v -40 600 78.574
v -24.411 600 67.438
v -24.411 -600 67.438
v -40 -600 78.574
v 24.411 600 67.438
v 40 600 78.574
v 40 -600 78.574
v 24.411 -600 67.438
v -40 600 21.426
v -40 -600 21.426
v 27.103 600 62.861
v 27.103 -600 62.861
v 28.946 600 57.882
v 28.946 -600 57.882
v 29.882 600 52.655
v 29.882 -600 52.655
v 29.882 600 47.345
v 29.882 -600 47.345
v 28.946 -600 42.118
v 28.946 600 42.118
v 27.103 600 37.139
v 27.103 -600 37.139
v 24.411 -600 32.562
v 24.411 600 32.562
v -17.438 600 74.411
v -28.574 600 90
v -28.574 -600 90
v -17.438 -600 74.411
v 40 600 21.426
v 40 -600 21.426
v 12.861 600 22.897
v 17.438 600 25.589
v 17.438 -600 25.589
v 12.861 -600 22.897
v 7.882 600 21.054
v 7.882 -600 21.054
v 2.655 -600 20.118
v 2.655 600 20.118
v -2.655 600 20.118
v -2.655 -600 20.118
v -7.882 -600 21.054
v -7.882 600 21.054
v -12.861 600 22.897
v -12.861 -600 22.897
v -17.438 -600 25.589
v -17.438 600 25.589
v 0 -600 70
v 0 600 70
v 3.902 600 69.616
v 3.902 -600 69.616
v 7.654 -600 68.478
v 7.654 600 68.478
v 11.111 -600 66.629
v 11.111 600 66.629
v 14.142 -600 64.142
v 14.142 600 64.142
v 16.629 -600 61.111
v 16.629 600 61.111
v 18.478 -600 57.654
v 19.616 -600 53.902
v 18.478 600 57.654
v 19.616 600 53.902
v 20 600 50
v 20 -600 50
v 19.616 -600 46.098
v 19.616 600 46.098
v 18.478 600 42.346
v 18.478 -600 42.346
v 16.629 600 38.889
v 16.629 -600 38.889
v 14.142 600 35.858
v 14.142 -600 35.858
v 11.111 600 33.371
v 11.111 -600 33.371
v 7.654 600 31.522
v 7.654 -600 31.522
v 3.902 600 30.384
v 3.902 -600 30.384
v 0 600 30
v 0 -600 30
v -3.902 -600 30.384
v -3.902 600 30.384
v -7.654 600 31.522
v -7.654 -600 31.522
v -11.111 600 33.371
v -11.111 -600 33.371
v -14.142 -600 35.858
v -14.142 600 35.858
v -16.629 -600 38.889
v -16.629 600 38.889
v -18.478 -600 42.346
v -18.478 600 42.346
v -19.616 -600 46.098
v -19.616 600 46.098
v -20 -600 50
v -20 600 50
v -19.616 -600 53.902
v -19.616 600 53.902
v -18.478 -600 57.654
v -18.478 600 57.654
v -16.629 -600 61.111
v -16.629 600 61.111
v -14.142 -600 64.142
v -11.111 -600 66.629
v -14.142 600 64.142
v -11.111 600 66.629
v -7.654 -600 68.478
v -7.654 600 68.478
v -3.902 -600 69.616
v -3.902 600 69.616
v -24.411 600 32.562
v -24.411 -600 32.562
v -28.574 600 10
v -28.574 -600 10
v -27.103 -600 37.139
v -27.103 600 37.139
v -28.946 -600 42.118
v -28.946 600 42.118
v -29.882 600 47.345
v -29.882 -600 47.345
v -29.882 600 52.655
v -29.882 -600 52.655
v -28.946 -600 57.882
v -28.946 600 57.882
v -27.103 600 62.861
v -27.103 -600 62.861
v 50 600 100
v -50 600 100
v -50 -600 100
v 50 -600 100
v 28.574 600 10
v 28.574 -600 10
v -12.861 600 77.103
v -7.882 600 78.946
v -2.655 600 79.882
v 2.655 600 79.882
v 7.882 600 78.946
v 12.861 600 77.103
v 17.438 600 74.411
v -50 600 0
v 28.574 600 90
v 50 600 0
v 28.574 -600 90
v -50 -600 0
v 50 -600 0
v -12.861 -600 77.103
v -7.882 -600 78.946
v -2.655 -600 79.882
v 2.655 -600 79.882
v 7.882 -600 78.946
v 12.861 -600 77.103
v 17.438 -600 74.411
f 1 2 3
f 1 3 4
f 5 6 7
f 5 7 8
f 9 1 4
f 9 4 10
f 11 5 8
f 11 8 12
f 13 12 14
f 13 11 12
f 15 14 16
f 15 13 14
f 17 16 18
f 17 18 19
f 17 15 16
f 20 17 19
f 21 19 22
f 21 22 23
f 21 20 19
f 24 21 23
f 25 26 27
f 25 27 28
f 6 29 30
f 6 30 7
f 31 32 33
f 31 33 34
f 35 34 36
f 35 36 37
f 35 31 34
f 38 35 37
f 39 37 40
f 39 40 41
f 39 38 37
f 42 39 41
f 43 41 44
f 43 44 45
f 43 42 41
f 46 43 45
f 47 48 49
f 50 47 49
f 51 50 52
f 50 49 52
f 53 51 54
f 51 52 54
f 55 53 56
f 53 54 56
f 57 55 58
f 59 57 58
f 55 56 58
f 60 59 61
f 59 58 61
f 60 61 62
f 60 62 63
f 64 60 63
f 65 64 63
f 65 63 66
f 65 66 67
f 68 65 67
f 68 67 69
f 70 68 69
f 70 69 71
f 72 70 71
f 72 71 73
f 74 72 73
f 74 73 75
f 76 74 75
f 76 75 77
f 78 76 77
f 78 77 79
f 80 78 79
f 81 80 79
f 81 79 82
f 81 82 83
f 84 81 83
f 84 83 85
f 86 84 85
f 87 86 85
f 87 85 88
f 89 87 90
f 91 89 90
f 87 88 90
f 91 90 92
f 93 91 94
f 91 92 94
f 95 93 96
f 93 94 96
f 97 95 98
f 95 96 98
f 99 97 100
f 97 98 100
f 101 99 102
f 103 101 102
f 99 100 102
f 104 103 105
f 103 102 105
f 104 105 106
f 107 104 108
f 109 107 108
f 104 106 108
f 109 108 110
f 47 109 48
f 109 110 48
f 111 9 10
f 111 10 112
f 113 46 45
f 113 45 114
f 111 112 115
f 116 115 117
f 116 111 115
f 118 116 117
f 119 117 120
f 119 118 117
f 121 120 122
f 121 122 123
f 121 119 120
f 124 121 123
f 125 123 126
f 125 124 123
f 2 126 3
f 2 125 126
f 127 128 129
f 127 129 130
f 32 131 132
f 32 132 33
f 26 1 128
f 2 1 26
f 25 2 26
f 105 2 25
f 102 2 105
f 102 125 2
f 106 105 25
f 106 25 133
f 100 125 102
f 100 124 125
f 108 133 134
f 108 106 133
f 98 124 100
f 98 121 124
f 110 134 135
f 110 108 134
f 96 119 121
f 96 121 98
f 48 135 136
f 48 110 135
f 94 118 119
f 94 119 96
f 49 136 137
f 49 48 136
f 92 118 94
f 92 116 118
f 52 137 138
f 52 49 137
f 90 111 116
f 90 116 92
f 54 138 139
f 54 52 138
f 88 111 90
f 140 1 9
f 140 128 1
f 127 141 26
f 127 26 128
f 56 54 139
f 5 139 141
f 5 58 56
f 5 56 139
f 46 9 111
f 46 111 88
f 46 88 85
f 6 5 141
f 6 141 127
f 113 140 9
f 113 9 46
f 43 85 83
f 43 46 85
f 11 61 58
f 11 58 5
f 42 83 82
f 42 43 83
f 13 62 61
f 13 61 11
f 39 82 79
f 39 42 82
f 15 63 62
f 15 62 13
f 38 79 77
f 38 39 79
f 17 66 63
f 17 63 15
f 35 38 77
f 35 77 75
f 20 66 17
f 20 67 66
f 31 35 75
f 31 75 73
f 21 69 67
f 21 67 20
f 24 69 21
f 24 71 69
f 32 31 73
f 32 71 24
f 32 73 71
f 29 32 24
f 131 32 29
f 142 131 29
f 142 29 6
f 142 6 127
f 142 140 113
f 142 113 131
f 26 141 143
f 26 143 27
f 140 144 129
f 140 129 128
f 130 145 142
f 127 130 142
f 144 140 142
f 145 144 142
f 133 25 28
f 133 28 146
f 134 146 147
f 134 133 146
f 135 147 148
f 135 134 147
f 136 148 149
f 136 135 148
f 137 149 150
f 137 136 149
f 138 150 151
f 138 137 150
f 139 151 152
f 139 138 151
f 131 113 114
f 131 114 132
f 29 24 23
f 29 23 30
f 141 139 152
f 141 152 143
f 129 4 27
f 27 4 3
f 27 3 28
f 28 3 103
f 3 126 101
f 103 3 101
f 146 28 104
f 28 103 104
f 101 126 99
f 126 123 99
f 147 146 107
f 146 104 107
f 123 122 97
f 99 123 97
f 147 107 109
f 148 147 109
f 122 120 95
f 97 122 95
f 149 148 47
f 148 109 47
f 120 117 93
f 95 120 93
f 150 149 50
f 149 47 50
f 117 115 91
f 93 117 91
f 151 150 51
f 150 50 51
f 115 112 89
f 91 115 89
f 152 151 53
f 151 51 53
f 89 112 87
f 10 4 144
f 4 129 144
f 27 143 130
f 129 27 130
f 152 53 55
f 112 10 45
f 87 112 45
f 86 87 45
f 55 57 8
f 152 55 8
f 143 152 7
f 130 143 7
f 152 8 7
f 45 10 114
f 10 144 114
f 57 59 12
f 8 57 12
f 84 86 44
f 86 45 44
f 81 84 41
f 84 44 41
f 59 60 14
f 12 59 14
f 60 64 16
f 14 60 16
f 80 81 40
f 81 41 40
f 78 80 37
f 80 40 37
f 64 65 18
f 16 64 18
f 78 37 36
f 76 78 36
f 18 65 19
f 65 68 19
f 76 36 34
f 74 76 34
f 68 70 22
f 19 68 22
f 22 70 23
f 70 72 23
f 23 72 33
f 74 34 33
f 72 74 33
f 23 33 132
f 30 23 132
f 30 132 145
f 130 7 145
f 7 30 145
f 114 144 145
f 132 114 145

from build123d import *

# Parameters (mm, degrees)
SKETCH1_W           = 100
SKETCH1_H           = 1200
BOSS_EXTRUDE1_DEPTH = 100
SKETCH3_R           = 20
CUT_EXTRUDE1_DEPTH  = 1206.197079319


with BuildPart() as part:
    # Sketch1 → Boss-Extrude1 (new body)
    with BuildSketch(Plane.XY):
        Rectangle(SKETCH1_W, SKETCH1_H)
    extrude(amount=BOSS_EXTRUDE1_DEPTH)

    # Sketch3 → Cut-Extrude1 (cut, through all)
    with BuildSketch(Plane(origin=(0, 600, 0), x_dir=(1, 0, 0), z_dir=(0, 1, 0))):
        with Locations(Location((0, -50, 0), (0, 0, 270))):
            Circle(SKETCH3_R)
        with BuildLine():
            Line((-24.411222461, -67.438240105), (-40, -78.57413656))
            Line((-40, -78.57413656), (-40, -21.42586344))
            Line((-40, -21.42586344), (-24.411222461, -32.561759895))
            ThreePointArc((-24.411222461, -32.561759895), (-30, -50), (-24.411222461, -67.438240105))
        make_face()
        with BuildLine():
            Line((-17.438240105, -25.588777539), (-28.57413656, -10))
            Line((-28.57413656, -10), (28.57413656, -10))
            Line((28.57413656, -10), (17.438240105, -25.588777539))
            ThreePointArc((17.438240105, -25.588777539), (0, -20), (-17.438240105, -25.588777539))
        make_face()
        with BuildLine():
            Line((24.411222461, -32.561759895), (40, -21.42586344))
            Line((40, -21.42586344), (40, -78.57413656))
            Line((40, -78.57413656), (24.411222461, -67.438240105))
            ThreePointArc((24.411222461, -67.438240105), (30, -50), (24.411222461, -32.561759895))
        make_face()
        with BuildLine():
            Line((17.438240105, -74.411222461), (28.57413656, -90))
            Line((28.57413656, -90), (-28.57413656, -90))
            Line((-28.57413656, -90), (-17.438240105, -74.411222461))
            ThreePointArc((-17.438240105, -74.411222461), (0, -80), (17.438240105, -74.411222461))
        make_face()
    extrude(amount=-CUT_EXTRUDE1_DEPTH, mode=Mode.SUBTRACT)


solid = part.part
